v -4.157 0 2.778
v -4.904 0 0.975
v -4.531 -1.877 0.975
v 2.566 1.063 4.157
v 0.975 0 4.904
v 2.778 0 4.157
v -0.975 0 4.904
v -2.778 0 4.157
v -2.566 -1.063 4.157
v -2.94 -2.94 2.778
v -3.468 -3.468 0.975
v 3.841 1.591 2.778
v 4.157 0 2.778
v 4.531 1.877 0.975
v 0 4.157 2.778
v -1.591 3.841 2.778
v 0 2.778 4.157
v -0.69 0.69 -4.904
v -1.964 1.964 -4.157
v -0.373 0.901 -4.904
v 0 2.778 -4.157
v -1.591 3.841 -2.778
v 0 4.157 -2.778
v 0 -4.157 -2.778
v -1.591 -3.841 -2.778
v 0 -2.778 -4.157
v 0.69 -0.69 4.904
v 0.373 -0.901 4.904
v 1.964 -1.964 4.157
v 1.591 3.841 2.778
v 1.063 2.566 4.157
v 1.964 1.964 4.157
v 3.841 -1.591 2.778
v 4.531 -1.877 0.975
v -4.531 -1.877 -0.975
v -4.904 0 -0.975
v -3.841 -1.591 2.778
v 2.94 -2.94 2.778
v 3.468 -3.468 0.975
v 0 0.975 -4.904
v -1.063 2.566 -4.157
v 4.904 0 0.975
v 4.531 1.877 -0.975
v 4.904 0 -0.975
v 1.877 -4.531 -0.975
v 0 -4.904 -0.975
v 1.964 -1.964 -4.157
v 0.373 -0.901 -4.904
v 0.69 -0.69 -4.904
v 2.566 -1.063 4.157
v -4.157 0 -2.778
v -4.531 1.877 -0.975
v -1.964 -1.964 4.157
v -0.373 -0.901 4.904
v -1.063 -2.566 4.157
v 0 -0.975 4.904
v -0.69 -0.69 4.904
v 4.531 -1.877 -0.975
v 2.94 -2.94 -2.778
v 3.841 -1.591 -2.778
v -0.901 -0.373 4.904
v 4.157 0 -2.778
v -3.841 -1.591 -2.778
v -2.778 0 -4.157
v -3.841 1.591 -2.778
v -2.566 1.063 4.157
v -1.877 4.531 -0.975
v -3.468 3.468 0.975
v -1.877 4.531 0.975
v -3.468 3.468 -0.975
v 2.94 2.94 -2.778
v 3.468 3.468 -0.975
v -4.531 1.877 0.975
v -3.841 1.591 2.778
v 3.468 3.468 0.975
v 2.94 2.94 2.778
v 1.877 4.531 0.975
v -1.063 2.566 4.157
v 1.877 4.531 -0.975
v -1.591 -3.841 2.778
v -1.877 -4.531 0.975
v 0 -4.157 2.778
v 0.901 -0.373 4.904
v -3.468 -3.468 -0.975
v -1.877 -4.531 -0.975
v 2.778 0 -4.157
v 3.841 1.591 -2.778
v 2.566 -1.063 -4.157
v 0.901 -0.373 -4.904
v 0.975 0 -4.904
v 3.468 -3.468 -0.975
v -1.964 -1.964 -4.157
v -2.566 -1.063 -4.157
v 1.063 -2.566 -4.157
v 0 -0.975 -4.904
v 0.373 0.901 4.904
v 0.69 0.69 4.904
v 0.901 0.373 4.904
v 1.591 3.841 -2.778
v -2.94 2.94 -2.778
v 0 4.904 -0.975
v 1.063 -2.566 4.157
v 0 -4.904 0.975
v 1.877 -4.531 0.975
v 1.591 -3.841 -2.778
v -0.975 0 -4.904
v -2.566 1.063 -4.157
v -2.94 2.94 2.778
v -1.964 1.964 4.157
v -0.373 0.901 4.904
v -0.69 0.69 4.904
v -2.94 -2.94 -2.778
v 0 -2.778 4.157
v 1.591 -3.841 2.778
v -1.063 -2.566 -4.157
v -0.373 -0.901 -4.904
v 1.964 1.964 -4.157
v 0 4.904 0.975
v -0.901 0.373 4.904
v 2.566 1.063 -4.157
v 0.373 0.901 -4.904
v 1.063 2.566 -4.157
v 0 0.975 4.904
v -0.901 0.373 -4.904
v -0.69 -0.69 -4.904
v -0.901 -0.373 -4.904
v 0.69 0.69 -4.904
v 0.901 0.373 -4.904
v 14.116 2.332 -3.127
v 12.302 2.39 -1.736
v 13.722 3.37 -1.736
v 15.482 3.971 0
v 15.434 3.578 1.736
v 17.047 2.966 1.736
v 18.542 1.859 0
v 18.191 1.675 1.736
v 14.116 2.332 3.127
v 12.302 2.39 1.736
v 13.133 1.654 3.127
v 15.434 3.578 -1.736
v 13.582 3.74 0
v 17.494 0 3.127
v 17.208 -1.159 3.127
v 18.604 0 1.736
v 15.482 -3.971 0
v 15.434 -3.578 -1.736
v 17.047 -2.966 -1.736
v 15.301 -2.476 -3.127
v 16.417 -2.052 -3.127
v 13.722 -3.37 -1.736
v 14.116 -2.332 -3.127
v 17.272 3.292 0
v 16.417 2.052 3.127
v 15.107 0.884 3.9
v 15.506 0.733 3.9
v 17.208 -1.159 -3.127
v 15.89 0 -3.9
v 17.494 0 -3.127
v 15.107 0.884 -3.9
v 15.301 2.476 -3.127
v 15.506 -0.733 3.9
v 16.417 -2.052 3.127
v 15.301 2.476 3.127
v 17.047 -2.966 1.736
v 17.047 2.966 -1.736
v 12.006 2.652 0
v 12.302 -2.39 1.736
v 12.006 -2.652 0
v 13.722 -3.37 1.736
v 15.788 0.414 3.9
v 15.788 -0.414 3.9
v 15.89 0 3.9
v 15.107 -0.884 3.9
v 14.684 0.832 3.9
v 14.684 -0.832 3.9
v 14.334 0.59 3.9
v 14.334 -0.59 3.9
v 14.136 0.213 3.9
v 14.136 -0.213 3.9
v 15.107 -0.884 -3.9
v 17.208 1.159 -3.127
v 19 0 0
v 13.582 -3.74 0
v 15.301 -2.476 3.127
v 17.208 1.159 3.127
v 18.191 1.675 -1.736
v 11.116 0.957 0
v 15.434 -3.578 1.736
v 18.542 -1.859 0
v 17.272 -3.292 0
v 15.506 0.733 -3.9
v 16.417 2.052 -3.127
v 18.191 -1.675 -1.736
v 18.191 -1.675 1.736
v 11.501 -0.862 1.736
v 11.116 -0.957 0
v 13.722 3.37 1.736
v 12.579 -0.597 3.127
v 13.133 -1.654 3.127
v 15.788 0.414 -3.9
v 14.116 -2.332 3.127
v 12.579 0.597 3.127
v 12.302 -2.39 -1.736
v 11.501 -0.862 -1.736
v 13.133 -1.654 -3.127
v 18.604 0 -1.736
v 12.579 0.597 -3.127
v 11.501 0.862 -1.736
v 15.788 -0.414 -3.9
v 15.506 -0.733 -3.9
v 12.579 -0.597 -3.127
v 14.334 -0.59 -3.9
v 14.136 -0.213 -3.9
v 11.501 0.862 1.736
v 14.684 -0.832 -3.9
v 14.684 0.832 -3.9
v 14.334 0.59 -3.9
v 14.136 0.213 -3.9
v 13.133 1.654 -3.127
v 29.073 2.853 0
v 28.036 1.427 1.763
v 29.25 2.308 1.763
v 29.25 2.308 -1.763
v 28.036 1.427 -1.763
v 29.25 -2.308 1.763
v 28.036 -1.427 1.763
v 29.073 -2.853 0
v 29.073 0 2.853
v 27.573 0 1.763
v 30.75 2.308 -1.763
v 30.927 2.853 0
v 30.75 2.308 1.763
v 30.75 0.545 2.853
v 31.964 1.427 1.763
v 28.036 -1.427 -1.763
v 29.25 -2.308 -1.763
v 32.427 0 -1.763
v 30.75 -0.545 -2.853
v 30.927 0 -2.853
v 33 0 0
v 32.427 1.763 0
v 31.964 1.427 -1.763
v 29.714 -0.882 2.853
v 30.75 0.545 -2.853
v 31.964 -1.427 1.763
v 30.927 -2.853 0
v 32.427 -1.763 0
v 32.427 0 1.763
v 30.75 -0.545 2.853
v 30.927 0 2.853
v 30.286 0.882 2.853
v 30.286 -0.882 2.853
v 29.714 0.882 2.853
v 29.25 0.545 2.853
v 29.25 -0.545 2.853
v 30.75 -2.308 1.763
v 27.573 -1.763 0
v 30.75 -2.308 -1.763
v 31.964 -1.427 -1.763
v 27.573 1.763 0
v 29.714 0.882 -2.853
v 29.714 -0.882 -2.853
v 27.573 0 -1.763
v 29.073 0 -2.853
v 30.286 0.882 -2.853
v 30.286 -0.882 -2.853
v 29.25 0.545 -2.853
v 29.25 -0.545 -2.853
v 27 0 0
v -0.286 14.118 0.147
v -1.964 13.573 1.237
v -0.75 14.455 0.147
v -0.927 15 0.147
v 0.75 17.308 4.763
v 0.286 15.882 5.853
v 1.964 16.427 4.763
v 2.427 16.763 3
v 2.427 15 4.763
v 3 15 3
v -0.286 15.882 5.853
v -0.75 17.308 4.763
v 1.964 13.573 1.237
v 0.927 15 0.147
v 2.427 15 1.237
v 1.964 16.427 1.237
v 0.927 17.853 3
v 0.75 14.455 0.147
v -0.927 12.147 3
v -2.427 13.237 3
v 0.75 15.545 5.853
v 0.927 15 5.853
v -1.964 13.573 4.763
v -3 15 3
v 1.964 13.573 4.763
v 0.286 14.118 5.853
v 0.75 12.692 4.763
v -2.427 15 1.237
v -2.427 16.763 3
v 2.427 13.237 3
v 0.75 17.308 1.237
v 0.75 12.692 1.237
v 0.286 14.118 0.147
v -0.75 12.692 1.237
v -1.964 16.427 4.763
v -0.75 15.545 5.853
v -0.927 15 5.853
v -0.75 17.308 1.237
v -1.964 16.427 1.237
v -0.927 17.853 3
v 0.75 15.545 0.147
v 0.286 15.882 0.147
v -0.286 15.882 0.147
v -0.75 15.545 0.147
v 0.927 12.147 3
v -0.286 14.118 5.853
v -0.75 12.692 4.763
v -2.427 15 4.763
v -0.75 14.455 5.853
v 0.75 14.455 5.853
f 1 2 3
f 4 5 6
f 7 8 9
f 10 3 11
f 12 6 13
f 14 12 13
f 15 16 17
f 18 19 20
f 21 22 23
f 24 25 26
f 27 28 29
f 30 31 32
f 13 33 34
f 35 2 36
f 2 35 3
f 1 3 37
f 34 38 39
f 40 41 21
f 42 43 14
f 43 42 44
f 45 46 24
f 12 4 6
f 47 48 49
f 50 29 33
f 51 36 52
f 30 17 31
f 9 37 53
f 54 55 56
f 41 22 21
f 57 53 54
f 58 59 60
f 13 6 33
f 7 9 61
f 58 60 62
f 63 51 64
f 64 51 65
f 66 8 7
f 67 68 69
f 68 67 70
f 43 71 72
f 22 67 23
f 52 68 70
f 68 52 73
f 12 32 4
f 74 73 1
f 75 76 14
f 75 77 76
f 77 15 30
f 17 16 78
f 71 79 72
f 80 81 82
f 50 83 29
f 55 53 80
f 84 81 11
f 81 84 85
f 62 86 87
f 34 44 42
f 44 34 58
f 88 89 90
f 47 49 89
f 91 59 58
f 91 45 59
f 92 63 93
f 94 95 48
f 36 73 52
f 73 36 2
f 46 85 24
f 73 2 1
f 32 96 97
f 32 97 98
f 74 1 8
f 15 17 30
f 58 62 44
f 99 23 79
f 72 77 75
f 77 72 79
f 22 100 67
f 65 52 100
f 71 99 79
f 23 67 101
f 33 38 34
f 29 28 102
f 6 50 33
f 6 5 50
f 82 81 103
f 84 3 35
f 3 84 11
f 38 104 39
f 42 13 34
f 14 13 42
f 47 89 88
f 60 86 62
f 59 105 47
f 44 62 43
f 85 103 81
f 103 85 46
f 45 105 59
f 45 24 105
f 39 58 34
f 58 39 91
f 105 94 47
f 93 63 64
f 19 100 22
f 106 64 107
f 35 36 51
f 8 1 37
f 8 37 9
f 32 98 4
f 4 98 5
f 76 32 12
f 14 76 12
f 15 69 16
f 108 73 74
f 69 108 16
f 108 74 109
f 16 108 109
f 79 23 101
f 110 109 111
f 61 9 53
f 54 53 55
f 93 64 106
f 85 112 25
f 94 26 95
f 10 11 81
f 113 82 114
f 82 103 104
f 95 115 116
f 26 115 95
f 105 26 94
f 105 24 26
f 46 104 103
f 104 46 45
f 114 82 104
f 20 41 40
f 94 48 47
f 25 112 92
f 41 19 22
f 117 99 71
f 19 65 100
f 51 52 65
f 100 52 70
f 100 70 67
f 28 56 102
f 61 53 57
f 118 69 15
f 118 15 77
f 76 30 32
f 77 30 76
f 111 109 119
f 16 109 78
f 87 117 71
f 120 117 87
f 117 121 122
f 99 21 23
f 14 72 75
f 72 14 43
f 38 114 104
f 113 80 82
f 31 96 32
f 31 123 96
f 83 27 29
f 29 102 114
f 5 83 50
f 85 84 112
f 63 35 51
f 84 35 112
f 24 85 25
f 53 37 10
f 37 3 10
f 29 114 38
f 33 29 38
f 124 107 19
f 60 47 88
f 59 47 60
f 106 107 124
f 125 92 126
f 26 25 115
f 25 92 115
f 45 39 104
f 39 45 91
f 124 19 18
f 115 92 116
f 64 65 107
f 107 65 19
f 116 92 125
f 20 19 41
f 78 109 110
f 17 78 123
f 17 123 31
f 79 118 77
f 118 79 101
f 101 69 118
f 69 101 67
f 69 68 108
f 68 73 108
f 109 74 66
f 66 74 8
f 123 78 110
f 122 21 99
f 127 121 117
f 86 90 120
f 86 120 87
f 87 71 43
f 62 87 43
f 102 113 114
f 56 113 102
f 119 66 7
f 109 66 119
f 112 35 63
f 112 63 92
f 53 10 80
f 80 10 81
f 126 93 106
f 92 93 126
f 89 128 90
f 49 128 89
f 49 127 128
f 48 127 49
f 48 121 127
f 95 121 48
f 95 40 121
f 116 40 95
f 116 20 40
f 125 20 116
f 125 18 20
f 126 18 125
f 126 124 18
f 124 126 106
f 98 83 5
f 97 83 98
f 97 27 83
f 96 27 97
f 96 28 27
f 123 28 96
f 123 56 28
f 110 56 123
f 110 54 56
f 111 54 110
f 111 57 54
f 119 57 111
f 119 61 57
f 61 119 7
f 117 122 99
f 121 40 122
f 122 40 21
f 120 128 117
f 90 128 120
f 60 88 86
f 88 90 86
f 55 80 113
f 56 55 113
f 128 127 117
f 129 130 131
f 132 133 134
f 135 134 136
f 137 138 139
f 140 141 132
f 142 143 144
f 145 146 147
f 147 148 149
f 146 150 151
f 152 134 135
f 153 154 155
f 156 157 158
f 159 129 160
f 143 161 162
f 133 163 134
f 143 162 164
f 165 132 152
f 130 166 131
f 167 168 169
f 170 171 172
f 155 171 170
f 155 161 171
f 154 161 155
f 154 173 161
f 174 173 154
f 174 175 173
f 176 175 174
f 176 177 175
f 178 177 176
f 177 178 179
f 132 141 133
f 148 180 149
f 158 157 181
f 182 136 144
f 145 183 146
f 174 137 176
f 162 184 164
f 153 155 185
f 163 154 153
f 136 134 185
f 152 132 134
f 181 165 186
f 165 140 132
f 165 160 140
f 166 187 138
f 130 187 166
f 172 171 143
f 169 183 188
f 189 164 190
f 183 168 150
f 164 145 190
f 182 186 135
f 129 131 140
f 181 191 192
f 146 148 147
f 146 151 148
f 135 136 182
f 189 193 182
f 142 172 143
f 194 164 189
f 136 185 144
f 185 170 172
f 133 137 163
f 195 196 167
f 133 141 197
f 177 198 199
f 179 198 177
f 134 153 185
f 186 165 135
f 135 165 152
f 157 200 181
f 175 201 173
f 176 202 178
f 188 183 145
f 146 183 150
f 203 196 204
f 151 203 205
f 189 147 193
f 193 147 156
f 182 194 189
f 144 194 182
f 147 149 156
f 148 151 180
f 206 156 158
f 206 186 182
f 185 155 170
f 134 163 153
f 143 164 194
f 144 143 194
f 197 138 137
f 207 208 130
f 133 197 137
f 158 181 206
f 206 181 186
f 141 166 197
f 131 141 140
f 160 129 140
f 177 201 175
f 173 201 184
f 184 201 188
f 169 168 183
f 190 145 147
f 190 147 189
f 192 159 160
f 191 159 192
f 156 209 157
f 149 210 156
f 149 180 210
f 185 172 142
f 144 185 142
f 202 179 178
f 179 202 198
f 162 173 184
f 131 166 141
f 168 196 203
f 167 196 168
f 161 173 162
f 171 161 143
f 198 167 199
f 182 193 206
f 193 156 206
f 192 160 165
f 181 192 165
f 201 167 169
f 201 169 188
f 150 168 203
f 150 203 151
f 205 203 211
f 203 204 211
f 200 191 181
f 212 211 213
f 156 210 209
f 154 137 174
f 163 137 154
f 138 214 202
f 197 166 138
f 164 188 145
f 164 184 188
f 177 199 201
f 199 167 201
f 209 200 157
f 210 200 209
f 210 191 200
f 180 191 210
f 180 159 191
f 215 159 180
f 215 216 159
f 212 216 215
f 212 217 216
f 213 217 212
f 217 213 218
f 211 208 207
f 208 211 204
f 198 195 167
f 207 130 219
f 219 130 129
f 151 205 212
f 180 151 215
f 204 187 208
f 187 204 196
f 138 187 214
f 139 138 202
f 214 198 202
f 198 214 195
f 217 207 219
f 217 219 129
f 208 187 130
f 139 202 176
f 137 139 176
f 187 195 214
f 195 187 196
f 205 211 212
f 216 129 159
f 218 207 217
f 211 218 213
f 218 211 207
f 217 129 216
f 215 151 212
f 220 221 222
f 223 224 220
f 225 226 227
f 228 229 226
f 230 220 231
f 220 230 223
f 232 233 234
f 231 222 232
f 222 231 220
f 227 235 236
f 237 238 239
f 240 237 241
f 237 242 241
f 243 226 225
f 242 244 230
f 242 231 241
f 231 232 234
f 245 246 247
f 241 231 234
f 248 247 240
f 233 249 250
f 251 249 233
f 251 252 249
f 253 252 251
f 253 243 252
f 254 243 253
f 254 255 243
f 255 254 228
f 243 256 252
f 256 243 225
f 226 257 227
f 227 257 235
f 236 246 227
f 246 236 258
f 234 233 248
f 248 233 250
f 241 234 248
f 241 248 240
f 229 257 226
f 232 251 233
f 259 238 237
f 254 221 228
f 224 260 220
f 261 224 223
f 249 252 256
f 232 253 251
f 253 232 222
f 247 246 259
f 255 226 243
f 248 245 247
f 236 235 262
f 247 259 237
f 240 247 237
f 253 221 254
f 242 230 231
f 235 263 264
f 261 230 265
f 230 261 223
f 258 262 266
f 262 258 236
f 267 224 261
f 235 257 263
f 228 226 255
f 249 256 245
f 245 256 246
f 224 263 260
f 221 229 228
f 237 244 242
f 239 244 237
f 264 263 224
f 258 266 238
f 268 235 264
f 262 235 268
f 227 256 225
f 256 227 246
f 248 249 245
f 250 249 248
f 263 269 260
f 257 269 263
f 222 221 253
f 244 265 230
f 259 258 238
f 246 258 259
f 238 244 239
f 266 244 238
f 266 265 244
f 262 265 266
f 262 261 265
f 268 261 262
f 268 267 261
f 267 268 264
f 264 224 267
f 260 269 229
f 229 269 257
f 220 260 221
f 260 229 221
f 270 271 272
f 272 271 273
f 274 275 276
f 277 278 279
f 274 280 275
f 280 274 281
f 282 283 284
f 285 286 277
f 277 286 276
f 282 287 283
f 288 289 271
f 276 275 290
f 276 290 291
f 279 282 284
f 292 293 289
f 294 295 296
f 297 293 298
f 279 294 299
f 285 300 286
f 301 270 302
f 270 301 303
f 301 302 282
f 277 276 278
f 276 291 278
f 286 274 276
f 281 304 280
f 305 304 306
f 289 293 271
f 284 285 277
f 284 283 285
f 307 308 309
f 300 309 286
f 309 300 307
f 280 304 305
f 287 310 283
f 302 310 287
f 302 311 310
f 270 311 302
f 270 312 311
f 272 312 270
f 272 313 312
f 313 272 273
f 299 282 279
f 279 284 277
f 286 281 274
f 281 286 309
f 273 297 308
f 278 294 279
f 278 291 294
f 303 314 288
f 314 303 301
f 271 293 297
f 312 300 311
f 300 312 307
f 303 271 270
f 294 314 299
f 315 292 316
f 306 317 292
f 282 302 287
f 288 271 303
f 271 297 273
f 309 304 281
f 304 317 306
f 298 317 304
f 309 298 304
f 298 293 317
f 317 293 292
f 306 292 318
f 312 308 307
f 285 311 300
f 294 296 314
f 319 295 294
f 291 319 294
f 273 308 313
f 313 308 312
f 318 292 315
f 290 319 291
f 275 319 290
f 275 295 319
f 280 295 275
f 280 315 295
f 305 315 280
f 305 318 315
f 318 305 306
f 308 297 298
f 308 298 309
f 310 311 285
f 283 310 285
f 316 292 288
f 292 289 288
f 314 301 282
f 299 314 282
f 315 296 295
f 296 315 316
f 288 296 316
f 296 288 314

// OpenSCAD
// Purpose: sphere with r, d and as a positional argument, translated.
sphere(5);
translate([15, 0, 0]) sphere(r = 4);
translate([30, 0, 0]) sphere(d = 6);
translate([0, 15, 3]) sphere(3);
